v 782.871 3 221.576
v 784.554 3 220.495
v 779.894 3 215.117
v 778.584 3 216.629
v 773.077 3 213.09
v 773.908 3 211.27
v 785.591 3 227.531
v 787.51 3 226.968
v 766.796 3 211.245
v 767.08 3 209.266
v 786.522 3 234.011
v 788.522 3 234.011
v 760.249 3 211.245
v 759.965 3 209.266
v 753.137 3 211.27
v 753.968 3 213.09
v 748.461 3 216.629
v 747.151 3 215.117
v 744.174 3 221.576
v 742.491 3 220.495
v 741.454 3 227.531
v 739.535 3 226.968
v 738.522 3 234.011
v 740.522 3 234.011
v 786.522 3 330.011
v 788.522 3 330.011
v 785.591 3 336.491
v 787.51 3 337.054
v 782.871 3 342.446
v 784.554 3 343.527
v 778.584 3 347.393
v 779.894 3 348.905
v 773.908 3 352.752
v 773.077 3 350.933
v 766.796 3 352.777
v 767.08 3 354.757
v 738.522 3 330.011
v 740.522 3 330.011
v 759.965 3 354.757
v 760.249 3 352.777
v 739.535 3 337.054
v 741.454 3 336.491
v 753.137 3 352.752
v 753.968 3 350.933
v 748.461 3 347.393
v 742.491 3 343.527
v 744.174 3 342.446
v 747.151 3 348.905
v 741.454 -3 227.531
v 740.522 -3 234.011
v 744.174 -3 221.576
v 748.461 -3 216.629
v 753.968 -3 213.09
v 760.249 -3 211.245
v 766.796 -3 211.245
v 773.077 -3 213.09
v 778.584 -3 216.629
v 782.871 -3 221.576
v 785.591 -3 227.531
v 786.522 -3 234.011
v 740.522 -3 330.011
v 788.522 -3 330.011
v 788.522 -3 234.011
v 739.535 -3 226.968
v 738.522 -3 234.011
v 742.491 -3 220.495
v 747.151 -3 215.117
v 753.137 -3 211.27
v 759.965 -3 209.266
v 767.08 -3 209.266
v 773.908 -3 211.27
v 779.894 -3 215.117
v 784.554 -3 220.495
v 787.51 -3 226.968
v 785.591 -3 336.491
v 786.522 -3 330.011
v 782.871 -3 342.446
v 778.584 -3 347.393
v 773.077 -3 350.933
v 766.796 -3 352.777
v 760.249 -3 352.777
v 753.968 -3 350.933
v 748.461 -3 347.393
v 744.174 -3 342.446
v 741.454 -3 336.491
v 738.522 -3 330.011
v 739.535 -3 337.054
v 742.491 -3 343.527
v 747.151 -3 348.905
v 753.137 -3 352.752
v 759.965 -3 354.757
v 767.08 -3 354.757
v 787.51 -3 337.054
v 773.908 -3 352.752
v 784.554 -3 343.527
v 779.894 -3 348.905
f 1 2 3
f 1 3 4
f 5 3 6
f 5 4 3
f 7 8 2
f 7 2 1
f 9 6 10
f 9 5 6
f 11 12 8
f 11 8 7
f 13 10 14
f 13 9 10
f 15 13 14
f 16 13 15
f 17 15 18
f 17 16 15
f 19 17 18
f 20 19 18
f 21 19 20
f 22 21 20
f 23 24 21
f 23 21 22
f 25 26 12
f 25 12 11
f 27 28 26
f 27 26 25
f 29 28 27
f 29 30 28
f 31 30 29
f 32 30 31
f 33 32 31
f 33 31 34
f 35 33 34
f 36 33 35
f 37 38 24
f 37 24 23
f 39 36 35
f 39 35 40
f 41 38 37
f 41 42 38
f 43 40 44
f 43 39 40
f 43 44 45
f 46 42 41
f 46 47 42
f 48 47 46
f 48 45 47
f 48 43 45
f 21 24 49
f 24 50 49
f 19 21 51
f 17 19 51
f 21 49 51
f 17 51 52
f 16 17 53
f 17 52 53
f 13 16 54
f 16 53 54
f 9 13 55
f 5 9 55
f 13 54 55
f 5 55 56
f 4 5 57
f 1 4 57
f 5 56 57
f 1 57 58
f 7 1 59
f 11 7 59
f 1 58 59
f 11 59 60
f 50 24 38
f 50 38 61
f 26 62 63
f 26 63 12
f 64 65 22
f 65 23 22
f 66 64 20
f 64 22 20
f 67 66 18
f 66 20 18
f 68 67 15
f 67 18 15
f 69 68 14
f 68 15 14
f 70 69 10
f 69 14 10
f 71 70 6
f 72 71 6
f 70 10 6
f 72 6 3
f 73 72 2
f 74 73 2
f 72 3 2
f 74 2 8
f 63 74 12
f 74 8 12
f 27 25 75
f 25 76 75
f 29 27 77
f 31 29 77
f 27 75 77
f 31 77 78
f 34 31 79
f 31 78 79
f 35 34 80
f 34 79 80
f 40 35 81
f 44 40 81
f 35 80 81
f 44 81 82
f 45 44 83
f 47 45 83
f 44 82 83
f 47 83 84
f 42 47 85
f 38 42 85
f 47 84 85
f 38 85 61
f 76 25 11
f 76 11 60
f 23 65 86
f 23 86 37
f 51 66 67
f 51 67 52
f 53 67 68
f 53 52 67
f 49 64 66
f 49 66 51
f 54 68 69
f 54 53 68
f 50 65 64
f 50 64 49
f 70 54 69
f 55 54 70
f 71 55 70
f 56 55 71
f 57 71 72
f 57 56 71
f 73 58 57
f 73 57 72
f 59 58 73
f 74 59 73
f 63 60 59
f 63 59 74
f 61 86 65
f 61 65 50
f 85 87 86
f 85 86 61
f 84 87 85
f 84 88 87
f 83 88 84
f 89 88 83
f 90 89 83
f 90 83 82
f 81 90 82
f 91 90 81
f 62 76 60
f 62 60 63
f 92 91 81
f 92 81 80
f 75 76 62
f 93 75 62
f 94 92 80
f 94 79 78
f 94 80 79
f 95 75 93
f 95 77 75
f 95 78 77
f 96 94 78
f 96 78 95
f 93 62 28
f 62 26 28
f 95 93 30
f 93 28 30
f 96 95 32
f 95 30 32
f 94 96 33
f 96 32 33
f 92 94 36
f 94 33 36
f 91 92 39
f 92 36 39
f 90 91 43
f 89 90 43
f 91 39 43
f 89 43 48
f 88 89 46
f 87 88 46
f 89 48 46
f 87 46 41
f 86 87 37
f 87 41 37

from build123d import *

# Parameters (mm, degrees)
SKETCH2_W = 2
SKETCH2_H = 6


with BuildPart() as part:
    # Sweep1: sweep along a path in Sketch1
    with BuildLine(Plane(origin=(0, 0, 0), x_dir=(1, 0, 0), z_dir=(0, 1, 0))) as sweep1_path:
        Line((787.522377583, -234.011074688), (787.522377583, -330.011074688))
        ThreePointArc((787.522377583, -330.011074688), (763.522377583, -354.011074688), (739.522377583, -330.011074688))
        Line((739.522377583, -330.011074688), (739.522377583, -234.011074688))
        ThreePointArc((739.522377583, -234.011074688), (763.522377583, -210.011074688), (787.522377583, -234.011074688))
    # Sketch2 → Sweep1 (sweep)
    with BuildSketch(Plane(origin=(739.522377583, 0, 234.011074688), x_dir=(-1, 0, 0), z_dir=(0, 0, -1))):
        Rectangle(SKETCH2_W, SKETCH2_H)
    sweep(path=sweep1_path.line)


solid = part.part
